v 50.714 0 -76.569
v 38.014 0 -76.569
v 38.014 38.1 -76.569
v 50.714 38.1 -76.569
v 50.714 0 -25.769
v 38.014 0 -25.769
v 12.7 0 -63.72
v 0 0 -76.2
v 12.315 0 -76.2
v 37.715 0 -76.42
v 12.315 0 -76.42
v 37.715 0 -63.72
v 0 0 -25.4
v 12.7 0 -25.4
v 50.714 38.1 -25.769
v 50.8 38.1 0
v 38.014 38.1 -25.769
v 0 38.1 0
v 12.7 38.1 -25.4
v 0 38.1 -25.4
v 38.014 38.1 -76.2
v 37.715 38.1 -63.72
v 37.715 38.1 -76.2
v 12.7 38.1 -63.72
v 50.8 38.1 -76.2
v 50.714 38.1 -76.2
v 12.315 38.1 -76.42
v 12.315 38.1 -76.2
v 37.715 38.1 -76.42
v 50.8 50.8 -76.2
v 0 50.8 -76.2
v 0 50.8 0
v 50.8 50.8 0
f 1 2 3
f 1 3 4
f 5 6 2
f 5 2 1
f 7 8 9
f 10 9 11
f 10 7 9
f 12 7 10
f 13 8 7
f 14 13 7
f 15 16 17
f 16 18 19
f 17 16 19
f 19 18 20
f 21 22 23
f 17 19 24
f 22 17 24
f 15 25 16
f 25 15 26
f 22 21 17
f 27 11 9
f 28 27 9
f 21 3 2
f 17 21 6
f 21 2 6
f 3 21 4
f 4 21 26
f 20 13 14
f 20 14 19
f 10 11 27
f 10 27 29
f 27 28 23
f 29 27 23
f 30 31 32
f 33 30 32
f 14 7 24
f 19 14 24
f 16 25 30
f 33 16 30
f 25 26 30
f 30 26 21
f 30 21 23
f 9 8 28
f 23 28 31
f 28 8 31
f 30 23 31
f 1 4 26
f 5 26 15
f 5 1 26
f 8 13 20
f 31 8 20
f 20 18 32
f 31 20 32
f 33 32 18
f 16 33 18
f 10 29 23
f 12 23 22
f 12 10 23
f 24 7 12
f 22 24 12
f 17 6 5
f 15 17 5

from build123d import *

# Parameters (mm, degrees)
F1_DEPTH = 50.8
F0_W     = 38.1
F0_H     = 50.8
F2_DEPTH = 12.7
F3_W     = 25.4
F3_H     = 12.7
F4_DEPTH = 38.1
F5_W     = 12.7
F5_H     = 50.8
F6_DEPTH = 38.1


with BuildPart() as f1:
    # F0 (on Right) → F1 (new body)
    with BuildSketch(Plane.YZ):
        Polygon((38.1, 0), (38.1, -25.4), (38.1, -76.2), (50.8, -76.2), (50.8, 0), align=None)
    extrude(amount=F1_DEPTH)

    # F0 (on Right) → F2 (join)
    with BuildSketch(Plane.YZ):
        with Locations((19.05, -50.8)):
            Rectangle(F0_W, F0_H)
    extrude(amount=F2_DEPTH)

    # F3 (on Front) → F4 (join)
    with BuildSketch(Plane.XZ):
        with Locations((25.014978, -70.070165)):
            Rectangle(F3_W, F3_H)
    extrude(amount=-F4_DEPTH)

    # F5 (on Front) → F6 (join)
    with BuildSketch(Plane.XZ):
        with Locations((44.36385, -51.16912)):
            Rectangle(F5_W, F5_H)
    extrude(amount=-F6_DEPTH)


solid = f1.part
